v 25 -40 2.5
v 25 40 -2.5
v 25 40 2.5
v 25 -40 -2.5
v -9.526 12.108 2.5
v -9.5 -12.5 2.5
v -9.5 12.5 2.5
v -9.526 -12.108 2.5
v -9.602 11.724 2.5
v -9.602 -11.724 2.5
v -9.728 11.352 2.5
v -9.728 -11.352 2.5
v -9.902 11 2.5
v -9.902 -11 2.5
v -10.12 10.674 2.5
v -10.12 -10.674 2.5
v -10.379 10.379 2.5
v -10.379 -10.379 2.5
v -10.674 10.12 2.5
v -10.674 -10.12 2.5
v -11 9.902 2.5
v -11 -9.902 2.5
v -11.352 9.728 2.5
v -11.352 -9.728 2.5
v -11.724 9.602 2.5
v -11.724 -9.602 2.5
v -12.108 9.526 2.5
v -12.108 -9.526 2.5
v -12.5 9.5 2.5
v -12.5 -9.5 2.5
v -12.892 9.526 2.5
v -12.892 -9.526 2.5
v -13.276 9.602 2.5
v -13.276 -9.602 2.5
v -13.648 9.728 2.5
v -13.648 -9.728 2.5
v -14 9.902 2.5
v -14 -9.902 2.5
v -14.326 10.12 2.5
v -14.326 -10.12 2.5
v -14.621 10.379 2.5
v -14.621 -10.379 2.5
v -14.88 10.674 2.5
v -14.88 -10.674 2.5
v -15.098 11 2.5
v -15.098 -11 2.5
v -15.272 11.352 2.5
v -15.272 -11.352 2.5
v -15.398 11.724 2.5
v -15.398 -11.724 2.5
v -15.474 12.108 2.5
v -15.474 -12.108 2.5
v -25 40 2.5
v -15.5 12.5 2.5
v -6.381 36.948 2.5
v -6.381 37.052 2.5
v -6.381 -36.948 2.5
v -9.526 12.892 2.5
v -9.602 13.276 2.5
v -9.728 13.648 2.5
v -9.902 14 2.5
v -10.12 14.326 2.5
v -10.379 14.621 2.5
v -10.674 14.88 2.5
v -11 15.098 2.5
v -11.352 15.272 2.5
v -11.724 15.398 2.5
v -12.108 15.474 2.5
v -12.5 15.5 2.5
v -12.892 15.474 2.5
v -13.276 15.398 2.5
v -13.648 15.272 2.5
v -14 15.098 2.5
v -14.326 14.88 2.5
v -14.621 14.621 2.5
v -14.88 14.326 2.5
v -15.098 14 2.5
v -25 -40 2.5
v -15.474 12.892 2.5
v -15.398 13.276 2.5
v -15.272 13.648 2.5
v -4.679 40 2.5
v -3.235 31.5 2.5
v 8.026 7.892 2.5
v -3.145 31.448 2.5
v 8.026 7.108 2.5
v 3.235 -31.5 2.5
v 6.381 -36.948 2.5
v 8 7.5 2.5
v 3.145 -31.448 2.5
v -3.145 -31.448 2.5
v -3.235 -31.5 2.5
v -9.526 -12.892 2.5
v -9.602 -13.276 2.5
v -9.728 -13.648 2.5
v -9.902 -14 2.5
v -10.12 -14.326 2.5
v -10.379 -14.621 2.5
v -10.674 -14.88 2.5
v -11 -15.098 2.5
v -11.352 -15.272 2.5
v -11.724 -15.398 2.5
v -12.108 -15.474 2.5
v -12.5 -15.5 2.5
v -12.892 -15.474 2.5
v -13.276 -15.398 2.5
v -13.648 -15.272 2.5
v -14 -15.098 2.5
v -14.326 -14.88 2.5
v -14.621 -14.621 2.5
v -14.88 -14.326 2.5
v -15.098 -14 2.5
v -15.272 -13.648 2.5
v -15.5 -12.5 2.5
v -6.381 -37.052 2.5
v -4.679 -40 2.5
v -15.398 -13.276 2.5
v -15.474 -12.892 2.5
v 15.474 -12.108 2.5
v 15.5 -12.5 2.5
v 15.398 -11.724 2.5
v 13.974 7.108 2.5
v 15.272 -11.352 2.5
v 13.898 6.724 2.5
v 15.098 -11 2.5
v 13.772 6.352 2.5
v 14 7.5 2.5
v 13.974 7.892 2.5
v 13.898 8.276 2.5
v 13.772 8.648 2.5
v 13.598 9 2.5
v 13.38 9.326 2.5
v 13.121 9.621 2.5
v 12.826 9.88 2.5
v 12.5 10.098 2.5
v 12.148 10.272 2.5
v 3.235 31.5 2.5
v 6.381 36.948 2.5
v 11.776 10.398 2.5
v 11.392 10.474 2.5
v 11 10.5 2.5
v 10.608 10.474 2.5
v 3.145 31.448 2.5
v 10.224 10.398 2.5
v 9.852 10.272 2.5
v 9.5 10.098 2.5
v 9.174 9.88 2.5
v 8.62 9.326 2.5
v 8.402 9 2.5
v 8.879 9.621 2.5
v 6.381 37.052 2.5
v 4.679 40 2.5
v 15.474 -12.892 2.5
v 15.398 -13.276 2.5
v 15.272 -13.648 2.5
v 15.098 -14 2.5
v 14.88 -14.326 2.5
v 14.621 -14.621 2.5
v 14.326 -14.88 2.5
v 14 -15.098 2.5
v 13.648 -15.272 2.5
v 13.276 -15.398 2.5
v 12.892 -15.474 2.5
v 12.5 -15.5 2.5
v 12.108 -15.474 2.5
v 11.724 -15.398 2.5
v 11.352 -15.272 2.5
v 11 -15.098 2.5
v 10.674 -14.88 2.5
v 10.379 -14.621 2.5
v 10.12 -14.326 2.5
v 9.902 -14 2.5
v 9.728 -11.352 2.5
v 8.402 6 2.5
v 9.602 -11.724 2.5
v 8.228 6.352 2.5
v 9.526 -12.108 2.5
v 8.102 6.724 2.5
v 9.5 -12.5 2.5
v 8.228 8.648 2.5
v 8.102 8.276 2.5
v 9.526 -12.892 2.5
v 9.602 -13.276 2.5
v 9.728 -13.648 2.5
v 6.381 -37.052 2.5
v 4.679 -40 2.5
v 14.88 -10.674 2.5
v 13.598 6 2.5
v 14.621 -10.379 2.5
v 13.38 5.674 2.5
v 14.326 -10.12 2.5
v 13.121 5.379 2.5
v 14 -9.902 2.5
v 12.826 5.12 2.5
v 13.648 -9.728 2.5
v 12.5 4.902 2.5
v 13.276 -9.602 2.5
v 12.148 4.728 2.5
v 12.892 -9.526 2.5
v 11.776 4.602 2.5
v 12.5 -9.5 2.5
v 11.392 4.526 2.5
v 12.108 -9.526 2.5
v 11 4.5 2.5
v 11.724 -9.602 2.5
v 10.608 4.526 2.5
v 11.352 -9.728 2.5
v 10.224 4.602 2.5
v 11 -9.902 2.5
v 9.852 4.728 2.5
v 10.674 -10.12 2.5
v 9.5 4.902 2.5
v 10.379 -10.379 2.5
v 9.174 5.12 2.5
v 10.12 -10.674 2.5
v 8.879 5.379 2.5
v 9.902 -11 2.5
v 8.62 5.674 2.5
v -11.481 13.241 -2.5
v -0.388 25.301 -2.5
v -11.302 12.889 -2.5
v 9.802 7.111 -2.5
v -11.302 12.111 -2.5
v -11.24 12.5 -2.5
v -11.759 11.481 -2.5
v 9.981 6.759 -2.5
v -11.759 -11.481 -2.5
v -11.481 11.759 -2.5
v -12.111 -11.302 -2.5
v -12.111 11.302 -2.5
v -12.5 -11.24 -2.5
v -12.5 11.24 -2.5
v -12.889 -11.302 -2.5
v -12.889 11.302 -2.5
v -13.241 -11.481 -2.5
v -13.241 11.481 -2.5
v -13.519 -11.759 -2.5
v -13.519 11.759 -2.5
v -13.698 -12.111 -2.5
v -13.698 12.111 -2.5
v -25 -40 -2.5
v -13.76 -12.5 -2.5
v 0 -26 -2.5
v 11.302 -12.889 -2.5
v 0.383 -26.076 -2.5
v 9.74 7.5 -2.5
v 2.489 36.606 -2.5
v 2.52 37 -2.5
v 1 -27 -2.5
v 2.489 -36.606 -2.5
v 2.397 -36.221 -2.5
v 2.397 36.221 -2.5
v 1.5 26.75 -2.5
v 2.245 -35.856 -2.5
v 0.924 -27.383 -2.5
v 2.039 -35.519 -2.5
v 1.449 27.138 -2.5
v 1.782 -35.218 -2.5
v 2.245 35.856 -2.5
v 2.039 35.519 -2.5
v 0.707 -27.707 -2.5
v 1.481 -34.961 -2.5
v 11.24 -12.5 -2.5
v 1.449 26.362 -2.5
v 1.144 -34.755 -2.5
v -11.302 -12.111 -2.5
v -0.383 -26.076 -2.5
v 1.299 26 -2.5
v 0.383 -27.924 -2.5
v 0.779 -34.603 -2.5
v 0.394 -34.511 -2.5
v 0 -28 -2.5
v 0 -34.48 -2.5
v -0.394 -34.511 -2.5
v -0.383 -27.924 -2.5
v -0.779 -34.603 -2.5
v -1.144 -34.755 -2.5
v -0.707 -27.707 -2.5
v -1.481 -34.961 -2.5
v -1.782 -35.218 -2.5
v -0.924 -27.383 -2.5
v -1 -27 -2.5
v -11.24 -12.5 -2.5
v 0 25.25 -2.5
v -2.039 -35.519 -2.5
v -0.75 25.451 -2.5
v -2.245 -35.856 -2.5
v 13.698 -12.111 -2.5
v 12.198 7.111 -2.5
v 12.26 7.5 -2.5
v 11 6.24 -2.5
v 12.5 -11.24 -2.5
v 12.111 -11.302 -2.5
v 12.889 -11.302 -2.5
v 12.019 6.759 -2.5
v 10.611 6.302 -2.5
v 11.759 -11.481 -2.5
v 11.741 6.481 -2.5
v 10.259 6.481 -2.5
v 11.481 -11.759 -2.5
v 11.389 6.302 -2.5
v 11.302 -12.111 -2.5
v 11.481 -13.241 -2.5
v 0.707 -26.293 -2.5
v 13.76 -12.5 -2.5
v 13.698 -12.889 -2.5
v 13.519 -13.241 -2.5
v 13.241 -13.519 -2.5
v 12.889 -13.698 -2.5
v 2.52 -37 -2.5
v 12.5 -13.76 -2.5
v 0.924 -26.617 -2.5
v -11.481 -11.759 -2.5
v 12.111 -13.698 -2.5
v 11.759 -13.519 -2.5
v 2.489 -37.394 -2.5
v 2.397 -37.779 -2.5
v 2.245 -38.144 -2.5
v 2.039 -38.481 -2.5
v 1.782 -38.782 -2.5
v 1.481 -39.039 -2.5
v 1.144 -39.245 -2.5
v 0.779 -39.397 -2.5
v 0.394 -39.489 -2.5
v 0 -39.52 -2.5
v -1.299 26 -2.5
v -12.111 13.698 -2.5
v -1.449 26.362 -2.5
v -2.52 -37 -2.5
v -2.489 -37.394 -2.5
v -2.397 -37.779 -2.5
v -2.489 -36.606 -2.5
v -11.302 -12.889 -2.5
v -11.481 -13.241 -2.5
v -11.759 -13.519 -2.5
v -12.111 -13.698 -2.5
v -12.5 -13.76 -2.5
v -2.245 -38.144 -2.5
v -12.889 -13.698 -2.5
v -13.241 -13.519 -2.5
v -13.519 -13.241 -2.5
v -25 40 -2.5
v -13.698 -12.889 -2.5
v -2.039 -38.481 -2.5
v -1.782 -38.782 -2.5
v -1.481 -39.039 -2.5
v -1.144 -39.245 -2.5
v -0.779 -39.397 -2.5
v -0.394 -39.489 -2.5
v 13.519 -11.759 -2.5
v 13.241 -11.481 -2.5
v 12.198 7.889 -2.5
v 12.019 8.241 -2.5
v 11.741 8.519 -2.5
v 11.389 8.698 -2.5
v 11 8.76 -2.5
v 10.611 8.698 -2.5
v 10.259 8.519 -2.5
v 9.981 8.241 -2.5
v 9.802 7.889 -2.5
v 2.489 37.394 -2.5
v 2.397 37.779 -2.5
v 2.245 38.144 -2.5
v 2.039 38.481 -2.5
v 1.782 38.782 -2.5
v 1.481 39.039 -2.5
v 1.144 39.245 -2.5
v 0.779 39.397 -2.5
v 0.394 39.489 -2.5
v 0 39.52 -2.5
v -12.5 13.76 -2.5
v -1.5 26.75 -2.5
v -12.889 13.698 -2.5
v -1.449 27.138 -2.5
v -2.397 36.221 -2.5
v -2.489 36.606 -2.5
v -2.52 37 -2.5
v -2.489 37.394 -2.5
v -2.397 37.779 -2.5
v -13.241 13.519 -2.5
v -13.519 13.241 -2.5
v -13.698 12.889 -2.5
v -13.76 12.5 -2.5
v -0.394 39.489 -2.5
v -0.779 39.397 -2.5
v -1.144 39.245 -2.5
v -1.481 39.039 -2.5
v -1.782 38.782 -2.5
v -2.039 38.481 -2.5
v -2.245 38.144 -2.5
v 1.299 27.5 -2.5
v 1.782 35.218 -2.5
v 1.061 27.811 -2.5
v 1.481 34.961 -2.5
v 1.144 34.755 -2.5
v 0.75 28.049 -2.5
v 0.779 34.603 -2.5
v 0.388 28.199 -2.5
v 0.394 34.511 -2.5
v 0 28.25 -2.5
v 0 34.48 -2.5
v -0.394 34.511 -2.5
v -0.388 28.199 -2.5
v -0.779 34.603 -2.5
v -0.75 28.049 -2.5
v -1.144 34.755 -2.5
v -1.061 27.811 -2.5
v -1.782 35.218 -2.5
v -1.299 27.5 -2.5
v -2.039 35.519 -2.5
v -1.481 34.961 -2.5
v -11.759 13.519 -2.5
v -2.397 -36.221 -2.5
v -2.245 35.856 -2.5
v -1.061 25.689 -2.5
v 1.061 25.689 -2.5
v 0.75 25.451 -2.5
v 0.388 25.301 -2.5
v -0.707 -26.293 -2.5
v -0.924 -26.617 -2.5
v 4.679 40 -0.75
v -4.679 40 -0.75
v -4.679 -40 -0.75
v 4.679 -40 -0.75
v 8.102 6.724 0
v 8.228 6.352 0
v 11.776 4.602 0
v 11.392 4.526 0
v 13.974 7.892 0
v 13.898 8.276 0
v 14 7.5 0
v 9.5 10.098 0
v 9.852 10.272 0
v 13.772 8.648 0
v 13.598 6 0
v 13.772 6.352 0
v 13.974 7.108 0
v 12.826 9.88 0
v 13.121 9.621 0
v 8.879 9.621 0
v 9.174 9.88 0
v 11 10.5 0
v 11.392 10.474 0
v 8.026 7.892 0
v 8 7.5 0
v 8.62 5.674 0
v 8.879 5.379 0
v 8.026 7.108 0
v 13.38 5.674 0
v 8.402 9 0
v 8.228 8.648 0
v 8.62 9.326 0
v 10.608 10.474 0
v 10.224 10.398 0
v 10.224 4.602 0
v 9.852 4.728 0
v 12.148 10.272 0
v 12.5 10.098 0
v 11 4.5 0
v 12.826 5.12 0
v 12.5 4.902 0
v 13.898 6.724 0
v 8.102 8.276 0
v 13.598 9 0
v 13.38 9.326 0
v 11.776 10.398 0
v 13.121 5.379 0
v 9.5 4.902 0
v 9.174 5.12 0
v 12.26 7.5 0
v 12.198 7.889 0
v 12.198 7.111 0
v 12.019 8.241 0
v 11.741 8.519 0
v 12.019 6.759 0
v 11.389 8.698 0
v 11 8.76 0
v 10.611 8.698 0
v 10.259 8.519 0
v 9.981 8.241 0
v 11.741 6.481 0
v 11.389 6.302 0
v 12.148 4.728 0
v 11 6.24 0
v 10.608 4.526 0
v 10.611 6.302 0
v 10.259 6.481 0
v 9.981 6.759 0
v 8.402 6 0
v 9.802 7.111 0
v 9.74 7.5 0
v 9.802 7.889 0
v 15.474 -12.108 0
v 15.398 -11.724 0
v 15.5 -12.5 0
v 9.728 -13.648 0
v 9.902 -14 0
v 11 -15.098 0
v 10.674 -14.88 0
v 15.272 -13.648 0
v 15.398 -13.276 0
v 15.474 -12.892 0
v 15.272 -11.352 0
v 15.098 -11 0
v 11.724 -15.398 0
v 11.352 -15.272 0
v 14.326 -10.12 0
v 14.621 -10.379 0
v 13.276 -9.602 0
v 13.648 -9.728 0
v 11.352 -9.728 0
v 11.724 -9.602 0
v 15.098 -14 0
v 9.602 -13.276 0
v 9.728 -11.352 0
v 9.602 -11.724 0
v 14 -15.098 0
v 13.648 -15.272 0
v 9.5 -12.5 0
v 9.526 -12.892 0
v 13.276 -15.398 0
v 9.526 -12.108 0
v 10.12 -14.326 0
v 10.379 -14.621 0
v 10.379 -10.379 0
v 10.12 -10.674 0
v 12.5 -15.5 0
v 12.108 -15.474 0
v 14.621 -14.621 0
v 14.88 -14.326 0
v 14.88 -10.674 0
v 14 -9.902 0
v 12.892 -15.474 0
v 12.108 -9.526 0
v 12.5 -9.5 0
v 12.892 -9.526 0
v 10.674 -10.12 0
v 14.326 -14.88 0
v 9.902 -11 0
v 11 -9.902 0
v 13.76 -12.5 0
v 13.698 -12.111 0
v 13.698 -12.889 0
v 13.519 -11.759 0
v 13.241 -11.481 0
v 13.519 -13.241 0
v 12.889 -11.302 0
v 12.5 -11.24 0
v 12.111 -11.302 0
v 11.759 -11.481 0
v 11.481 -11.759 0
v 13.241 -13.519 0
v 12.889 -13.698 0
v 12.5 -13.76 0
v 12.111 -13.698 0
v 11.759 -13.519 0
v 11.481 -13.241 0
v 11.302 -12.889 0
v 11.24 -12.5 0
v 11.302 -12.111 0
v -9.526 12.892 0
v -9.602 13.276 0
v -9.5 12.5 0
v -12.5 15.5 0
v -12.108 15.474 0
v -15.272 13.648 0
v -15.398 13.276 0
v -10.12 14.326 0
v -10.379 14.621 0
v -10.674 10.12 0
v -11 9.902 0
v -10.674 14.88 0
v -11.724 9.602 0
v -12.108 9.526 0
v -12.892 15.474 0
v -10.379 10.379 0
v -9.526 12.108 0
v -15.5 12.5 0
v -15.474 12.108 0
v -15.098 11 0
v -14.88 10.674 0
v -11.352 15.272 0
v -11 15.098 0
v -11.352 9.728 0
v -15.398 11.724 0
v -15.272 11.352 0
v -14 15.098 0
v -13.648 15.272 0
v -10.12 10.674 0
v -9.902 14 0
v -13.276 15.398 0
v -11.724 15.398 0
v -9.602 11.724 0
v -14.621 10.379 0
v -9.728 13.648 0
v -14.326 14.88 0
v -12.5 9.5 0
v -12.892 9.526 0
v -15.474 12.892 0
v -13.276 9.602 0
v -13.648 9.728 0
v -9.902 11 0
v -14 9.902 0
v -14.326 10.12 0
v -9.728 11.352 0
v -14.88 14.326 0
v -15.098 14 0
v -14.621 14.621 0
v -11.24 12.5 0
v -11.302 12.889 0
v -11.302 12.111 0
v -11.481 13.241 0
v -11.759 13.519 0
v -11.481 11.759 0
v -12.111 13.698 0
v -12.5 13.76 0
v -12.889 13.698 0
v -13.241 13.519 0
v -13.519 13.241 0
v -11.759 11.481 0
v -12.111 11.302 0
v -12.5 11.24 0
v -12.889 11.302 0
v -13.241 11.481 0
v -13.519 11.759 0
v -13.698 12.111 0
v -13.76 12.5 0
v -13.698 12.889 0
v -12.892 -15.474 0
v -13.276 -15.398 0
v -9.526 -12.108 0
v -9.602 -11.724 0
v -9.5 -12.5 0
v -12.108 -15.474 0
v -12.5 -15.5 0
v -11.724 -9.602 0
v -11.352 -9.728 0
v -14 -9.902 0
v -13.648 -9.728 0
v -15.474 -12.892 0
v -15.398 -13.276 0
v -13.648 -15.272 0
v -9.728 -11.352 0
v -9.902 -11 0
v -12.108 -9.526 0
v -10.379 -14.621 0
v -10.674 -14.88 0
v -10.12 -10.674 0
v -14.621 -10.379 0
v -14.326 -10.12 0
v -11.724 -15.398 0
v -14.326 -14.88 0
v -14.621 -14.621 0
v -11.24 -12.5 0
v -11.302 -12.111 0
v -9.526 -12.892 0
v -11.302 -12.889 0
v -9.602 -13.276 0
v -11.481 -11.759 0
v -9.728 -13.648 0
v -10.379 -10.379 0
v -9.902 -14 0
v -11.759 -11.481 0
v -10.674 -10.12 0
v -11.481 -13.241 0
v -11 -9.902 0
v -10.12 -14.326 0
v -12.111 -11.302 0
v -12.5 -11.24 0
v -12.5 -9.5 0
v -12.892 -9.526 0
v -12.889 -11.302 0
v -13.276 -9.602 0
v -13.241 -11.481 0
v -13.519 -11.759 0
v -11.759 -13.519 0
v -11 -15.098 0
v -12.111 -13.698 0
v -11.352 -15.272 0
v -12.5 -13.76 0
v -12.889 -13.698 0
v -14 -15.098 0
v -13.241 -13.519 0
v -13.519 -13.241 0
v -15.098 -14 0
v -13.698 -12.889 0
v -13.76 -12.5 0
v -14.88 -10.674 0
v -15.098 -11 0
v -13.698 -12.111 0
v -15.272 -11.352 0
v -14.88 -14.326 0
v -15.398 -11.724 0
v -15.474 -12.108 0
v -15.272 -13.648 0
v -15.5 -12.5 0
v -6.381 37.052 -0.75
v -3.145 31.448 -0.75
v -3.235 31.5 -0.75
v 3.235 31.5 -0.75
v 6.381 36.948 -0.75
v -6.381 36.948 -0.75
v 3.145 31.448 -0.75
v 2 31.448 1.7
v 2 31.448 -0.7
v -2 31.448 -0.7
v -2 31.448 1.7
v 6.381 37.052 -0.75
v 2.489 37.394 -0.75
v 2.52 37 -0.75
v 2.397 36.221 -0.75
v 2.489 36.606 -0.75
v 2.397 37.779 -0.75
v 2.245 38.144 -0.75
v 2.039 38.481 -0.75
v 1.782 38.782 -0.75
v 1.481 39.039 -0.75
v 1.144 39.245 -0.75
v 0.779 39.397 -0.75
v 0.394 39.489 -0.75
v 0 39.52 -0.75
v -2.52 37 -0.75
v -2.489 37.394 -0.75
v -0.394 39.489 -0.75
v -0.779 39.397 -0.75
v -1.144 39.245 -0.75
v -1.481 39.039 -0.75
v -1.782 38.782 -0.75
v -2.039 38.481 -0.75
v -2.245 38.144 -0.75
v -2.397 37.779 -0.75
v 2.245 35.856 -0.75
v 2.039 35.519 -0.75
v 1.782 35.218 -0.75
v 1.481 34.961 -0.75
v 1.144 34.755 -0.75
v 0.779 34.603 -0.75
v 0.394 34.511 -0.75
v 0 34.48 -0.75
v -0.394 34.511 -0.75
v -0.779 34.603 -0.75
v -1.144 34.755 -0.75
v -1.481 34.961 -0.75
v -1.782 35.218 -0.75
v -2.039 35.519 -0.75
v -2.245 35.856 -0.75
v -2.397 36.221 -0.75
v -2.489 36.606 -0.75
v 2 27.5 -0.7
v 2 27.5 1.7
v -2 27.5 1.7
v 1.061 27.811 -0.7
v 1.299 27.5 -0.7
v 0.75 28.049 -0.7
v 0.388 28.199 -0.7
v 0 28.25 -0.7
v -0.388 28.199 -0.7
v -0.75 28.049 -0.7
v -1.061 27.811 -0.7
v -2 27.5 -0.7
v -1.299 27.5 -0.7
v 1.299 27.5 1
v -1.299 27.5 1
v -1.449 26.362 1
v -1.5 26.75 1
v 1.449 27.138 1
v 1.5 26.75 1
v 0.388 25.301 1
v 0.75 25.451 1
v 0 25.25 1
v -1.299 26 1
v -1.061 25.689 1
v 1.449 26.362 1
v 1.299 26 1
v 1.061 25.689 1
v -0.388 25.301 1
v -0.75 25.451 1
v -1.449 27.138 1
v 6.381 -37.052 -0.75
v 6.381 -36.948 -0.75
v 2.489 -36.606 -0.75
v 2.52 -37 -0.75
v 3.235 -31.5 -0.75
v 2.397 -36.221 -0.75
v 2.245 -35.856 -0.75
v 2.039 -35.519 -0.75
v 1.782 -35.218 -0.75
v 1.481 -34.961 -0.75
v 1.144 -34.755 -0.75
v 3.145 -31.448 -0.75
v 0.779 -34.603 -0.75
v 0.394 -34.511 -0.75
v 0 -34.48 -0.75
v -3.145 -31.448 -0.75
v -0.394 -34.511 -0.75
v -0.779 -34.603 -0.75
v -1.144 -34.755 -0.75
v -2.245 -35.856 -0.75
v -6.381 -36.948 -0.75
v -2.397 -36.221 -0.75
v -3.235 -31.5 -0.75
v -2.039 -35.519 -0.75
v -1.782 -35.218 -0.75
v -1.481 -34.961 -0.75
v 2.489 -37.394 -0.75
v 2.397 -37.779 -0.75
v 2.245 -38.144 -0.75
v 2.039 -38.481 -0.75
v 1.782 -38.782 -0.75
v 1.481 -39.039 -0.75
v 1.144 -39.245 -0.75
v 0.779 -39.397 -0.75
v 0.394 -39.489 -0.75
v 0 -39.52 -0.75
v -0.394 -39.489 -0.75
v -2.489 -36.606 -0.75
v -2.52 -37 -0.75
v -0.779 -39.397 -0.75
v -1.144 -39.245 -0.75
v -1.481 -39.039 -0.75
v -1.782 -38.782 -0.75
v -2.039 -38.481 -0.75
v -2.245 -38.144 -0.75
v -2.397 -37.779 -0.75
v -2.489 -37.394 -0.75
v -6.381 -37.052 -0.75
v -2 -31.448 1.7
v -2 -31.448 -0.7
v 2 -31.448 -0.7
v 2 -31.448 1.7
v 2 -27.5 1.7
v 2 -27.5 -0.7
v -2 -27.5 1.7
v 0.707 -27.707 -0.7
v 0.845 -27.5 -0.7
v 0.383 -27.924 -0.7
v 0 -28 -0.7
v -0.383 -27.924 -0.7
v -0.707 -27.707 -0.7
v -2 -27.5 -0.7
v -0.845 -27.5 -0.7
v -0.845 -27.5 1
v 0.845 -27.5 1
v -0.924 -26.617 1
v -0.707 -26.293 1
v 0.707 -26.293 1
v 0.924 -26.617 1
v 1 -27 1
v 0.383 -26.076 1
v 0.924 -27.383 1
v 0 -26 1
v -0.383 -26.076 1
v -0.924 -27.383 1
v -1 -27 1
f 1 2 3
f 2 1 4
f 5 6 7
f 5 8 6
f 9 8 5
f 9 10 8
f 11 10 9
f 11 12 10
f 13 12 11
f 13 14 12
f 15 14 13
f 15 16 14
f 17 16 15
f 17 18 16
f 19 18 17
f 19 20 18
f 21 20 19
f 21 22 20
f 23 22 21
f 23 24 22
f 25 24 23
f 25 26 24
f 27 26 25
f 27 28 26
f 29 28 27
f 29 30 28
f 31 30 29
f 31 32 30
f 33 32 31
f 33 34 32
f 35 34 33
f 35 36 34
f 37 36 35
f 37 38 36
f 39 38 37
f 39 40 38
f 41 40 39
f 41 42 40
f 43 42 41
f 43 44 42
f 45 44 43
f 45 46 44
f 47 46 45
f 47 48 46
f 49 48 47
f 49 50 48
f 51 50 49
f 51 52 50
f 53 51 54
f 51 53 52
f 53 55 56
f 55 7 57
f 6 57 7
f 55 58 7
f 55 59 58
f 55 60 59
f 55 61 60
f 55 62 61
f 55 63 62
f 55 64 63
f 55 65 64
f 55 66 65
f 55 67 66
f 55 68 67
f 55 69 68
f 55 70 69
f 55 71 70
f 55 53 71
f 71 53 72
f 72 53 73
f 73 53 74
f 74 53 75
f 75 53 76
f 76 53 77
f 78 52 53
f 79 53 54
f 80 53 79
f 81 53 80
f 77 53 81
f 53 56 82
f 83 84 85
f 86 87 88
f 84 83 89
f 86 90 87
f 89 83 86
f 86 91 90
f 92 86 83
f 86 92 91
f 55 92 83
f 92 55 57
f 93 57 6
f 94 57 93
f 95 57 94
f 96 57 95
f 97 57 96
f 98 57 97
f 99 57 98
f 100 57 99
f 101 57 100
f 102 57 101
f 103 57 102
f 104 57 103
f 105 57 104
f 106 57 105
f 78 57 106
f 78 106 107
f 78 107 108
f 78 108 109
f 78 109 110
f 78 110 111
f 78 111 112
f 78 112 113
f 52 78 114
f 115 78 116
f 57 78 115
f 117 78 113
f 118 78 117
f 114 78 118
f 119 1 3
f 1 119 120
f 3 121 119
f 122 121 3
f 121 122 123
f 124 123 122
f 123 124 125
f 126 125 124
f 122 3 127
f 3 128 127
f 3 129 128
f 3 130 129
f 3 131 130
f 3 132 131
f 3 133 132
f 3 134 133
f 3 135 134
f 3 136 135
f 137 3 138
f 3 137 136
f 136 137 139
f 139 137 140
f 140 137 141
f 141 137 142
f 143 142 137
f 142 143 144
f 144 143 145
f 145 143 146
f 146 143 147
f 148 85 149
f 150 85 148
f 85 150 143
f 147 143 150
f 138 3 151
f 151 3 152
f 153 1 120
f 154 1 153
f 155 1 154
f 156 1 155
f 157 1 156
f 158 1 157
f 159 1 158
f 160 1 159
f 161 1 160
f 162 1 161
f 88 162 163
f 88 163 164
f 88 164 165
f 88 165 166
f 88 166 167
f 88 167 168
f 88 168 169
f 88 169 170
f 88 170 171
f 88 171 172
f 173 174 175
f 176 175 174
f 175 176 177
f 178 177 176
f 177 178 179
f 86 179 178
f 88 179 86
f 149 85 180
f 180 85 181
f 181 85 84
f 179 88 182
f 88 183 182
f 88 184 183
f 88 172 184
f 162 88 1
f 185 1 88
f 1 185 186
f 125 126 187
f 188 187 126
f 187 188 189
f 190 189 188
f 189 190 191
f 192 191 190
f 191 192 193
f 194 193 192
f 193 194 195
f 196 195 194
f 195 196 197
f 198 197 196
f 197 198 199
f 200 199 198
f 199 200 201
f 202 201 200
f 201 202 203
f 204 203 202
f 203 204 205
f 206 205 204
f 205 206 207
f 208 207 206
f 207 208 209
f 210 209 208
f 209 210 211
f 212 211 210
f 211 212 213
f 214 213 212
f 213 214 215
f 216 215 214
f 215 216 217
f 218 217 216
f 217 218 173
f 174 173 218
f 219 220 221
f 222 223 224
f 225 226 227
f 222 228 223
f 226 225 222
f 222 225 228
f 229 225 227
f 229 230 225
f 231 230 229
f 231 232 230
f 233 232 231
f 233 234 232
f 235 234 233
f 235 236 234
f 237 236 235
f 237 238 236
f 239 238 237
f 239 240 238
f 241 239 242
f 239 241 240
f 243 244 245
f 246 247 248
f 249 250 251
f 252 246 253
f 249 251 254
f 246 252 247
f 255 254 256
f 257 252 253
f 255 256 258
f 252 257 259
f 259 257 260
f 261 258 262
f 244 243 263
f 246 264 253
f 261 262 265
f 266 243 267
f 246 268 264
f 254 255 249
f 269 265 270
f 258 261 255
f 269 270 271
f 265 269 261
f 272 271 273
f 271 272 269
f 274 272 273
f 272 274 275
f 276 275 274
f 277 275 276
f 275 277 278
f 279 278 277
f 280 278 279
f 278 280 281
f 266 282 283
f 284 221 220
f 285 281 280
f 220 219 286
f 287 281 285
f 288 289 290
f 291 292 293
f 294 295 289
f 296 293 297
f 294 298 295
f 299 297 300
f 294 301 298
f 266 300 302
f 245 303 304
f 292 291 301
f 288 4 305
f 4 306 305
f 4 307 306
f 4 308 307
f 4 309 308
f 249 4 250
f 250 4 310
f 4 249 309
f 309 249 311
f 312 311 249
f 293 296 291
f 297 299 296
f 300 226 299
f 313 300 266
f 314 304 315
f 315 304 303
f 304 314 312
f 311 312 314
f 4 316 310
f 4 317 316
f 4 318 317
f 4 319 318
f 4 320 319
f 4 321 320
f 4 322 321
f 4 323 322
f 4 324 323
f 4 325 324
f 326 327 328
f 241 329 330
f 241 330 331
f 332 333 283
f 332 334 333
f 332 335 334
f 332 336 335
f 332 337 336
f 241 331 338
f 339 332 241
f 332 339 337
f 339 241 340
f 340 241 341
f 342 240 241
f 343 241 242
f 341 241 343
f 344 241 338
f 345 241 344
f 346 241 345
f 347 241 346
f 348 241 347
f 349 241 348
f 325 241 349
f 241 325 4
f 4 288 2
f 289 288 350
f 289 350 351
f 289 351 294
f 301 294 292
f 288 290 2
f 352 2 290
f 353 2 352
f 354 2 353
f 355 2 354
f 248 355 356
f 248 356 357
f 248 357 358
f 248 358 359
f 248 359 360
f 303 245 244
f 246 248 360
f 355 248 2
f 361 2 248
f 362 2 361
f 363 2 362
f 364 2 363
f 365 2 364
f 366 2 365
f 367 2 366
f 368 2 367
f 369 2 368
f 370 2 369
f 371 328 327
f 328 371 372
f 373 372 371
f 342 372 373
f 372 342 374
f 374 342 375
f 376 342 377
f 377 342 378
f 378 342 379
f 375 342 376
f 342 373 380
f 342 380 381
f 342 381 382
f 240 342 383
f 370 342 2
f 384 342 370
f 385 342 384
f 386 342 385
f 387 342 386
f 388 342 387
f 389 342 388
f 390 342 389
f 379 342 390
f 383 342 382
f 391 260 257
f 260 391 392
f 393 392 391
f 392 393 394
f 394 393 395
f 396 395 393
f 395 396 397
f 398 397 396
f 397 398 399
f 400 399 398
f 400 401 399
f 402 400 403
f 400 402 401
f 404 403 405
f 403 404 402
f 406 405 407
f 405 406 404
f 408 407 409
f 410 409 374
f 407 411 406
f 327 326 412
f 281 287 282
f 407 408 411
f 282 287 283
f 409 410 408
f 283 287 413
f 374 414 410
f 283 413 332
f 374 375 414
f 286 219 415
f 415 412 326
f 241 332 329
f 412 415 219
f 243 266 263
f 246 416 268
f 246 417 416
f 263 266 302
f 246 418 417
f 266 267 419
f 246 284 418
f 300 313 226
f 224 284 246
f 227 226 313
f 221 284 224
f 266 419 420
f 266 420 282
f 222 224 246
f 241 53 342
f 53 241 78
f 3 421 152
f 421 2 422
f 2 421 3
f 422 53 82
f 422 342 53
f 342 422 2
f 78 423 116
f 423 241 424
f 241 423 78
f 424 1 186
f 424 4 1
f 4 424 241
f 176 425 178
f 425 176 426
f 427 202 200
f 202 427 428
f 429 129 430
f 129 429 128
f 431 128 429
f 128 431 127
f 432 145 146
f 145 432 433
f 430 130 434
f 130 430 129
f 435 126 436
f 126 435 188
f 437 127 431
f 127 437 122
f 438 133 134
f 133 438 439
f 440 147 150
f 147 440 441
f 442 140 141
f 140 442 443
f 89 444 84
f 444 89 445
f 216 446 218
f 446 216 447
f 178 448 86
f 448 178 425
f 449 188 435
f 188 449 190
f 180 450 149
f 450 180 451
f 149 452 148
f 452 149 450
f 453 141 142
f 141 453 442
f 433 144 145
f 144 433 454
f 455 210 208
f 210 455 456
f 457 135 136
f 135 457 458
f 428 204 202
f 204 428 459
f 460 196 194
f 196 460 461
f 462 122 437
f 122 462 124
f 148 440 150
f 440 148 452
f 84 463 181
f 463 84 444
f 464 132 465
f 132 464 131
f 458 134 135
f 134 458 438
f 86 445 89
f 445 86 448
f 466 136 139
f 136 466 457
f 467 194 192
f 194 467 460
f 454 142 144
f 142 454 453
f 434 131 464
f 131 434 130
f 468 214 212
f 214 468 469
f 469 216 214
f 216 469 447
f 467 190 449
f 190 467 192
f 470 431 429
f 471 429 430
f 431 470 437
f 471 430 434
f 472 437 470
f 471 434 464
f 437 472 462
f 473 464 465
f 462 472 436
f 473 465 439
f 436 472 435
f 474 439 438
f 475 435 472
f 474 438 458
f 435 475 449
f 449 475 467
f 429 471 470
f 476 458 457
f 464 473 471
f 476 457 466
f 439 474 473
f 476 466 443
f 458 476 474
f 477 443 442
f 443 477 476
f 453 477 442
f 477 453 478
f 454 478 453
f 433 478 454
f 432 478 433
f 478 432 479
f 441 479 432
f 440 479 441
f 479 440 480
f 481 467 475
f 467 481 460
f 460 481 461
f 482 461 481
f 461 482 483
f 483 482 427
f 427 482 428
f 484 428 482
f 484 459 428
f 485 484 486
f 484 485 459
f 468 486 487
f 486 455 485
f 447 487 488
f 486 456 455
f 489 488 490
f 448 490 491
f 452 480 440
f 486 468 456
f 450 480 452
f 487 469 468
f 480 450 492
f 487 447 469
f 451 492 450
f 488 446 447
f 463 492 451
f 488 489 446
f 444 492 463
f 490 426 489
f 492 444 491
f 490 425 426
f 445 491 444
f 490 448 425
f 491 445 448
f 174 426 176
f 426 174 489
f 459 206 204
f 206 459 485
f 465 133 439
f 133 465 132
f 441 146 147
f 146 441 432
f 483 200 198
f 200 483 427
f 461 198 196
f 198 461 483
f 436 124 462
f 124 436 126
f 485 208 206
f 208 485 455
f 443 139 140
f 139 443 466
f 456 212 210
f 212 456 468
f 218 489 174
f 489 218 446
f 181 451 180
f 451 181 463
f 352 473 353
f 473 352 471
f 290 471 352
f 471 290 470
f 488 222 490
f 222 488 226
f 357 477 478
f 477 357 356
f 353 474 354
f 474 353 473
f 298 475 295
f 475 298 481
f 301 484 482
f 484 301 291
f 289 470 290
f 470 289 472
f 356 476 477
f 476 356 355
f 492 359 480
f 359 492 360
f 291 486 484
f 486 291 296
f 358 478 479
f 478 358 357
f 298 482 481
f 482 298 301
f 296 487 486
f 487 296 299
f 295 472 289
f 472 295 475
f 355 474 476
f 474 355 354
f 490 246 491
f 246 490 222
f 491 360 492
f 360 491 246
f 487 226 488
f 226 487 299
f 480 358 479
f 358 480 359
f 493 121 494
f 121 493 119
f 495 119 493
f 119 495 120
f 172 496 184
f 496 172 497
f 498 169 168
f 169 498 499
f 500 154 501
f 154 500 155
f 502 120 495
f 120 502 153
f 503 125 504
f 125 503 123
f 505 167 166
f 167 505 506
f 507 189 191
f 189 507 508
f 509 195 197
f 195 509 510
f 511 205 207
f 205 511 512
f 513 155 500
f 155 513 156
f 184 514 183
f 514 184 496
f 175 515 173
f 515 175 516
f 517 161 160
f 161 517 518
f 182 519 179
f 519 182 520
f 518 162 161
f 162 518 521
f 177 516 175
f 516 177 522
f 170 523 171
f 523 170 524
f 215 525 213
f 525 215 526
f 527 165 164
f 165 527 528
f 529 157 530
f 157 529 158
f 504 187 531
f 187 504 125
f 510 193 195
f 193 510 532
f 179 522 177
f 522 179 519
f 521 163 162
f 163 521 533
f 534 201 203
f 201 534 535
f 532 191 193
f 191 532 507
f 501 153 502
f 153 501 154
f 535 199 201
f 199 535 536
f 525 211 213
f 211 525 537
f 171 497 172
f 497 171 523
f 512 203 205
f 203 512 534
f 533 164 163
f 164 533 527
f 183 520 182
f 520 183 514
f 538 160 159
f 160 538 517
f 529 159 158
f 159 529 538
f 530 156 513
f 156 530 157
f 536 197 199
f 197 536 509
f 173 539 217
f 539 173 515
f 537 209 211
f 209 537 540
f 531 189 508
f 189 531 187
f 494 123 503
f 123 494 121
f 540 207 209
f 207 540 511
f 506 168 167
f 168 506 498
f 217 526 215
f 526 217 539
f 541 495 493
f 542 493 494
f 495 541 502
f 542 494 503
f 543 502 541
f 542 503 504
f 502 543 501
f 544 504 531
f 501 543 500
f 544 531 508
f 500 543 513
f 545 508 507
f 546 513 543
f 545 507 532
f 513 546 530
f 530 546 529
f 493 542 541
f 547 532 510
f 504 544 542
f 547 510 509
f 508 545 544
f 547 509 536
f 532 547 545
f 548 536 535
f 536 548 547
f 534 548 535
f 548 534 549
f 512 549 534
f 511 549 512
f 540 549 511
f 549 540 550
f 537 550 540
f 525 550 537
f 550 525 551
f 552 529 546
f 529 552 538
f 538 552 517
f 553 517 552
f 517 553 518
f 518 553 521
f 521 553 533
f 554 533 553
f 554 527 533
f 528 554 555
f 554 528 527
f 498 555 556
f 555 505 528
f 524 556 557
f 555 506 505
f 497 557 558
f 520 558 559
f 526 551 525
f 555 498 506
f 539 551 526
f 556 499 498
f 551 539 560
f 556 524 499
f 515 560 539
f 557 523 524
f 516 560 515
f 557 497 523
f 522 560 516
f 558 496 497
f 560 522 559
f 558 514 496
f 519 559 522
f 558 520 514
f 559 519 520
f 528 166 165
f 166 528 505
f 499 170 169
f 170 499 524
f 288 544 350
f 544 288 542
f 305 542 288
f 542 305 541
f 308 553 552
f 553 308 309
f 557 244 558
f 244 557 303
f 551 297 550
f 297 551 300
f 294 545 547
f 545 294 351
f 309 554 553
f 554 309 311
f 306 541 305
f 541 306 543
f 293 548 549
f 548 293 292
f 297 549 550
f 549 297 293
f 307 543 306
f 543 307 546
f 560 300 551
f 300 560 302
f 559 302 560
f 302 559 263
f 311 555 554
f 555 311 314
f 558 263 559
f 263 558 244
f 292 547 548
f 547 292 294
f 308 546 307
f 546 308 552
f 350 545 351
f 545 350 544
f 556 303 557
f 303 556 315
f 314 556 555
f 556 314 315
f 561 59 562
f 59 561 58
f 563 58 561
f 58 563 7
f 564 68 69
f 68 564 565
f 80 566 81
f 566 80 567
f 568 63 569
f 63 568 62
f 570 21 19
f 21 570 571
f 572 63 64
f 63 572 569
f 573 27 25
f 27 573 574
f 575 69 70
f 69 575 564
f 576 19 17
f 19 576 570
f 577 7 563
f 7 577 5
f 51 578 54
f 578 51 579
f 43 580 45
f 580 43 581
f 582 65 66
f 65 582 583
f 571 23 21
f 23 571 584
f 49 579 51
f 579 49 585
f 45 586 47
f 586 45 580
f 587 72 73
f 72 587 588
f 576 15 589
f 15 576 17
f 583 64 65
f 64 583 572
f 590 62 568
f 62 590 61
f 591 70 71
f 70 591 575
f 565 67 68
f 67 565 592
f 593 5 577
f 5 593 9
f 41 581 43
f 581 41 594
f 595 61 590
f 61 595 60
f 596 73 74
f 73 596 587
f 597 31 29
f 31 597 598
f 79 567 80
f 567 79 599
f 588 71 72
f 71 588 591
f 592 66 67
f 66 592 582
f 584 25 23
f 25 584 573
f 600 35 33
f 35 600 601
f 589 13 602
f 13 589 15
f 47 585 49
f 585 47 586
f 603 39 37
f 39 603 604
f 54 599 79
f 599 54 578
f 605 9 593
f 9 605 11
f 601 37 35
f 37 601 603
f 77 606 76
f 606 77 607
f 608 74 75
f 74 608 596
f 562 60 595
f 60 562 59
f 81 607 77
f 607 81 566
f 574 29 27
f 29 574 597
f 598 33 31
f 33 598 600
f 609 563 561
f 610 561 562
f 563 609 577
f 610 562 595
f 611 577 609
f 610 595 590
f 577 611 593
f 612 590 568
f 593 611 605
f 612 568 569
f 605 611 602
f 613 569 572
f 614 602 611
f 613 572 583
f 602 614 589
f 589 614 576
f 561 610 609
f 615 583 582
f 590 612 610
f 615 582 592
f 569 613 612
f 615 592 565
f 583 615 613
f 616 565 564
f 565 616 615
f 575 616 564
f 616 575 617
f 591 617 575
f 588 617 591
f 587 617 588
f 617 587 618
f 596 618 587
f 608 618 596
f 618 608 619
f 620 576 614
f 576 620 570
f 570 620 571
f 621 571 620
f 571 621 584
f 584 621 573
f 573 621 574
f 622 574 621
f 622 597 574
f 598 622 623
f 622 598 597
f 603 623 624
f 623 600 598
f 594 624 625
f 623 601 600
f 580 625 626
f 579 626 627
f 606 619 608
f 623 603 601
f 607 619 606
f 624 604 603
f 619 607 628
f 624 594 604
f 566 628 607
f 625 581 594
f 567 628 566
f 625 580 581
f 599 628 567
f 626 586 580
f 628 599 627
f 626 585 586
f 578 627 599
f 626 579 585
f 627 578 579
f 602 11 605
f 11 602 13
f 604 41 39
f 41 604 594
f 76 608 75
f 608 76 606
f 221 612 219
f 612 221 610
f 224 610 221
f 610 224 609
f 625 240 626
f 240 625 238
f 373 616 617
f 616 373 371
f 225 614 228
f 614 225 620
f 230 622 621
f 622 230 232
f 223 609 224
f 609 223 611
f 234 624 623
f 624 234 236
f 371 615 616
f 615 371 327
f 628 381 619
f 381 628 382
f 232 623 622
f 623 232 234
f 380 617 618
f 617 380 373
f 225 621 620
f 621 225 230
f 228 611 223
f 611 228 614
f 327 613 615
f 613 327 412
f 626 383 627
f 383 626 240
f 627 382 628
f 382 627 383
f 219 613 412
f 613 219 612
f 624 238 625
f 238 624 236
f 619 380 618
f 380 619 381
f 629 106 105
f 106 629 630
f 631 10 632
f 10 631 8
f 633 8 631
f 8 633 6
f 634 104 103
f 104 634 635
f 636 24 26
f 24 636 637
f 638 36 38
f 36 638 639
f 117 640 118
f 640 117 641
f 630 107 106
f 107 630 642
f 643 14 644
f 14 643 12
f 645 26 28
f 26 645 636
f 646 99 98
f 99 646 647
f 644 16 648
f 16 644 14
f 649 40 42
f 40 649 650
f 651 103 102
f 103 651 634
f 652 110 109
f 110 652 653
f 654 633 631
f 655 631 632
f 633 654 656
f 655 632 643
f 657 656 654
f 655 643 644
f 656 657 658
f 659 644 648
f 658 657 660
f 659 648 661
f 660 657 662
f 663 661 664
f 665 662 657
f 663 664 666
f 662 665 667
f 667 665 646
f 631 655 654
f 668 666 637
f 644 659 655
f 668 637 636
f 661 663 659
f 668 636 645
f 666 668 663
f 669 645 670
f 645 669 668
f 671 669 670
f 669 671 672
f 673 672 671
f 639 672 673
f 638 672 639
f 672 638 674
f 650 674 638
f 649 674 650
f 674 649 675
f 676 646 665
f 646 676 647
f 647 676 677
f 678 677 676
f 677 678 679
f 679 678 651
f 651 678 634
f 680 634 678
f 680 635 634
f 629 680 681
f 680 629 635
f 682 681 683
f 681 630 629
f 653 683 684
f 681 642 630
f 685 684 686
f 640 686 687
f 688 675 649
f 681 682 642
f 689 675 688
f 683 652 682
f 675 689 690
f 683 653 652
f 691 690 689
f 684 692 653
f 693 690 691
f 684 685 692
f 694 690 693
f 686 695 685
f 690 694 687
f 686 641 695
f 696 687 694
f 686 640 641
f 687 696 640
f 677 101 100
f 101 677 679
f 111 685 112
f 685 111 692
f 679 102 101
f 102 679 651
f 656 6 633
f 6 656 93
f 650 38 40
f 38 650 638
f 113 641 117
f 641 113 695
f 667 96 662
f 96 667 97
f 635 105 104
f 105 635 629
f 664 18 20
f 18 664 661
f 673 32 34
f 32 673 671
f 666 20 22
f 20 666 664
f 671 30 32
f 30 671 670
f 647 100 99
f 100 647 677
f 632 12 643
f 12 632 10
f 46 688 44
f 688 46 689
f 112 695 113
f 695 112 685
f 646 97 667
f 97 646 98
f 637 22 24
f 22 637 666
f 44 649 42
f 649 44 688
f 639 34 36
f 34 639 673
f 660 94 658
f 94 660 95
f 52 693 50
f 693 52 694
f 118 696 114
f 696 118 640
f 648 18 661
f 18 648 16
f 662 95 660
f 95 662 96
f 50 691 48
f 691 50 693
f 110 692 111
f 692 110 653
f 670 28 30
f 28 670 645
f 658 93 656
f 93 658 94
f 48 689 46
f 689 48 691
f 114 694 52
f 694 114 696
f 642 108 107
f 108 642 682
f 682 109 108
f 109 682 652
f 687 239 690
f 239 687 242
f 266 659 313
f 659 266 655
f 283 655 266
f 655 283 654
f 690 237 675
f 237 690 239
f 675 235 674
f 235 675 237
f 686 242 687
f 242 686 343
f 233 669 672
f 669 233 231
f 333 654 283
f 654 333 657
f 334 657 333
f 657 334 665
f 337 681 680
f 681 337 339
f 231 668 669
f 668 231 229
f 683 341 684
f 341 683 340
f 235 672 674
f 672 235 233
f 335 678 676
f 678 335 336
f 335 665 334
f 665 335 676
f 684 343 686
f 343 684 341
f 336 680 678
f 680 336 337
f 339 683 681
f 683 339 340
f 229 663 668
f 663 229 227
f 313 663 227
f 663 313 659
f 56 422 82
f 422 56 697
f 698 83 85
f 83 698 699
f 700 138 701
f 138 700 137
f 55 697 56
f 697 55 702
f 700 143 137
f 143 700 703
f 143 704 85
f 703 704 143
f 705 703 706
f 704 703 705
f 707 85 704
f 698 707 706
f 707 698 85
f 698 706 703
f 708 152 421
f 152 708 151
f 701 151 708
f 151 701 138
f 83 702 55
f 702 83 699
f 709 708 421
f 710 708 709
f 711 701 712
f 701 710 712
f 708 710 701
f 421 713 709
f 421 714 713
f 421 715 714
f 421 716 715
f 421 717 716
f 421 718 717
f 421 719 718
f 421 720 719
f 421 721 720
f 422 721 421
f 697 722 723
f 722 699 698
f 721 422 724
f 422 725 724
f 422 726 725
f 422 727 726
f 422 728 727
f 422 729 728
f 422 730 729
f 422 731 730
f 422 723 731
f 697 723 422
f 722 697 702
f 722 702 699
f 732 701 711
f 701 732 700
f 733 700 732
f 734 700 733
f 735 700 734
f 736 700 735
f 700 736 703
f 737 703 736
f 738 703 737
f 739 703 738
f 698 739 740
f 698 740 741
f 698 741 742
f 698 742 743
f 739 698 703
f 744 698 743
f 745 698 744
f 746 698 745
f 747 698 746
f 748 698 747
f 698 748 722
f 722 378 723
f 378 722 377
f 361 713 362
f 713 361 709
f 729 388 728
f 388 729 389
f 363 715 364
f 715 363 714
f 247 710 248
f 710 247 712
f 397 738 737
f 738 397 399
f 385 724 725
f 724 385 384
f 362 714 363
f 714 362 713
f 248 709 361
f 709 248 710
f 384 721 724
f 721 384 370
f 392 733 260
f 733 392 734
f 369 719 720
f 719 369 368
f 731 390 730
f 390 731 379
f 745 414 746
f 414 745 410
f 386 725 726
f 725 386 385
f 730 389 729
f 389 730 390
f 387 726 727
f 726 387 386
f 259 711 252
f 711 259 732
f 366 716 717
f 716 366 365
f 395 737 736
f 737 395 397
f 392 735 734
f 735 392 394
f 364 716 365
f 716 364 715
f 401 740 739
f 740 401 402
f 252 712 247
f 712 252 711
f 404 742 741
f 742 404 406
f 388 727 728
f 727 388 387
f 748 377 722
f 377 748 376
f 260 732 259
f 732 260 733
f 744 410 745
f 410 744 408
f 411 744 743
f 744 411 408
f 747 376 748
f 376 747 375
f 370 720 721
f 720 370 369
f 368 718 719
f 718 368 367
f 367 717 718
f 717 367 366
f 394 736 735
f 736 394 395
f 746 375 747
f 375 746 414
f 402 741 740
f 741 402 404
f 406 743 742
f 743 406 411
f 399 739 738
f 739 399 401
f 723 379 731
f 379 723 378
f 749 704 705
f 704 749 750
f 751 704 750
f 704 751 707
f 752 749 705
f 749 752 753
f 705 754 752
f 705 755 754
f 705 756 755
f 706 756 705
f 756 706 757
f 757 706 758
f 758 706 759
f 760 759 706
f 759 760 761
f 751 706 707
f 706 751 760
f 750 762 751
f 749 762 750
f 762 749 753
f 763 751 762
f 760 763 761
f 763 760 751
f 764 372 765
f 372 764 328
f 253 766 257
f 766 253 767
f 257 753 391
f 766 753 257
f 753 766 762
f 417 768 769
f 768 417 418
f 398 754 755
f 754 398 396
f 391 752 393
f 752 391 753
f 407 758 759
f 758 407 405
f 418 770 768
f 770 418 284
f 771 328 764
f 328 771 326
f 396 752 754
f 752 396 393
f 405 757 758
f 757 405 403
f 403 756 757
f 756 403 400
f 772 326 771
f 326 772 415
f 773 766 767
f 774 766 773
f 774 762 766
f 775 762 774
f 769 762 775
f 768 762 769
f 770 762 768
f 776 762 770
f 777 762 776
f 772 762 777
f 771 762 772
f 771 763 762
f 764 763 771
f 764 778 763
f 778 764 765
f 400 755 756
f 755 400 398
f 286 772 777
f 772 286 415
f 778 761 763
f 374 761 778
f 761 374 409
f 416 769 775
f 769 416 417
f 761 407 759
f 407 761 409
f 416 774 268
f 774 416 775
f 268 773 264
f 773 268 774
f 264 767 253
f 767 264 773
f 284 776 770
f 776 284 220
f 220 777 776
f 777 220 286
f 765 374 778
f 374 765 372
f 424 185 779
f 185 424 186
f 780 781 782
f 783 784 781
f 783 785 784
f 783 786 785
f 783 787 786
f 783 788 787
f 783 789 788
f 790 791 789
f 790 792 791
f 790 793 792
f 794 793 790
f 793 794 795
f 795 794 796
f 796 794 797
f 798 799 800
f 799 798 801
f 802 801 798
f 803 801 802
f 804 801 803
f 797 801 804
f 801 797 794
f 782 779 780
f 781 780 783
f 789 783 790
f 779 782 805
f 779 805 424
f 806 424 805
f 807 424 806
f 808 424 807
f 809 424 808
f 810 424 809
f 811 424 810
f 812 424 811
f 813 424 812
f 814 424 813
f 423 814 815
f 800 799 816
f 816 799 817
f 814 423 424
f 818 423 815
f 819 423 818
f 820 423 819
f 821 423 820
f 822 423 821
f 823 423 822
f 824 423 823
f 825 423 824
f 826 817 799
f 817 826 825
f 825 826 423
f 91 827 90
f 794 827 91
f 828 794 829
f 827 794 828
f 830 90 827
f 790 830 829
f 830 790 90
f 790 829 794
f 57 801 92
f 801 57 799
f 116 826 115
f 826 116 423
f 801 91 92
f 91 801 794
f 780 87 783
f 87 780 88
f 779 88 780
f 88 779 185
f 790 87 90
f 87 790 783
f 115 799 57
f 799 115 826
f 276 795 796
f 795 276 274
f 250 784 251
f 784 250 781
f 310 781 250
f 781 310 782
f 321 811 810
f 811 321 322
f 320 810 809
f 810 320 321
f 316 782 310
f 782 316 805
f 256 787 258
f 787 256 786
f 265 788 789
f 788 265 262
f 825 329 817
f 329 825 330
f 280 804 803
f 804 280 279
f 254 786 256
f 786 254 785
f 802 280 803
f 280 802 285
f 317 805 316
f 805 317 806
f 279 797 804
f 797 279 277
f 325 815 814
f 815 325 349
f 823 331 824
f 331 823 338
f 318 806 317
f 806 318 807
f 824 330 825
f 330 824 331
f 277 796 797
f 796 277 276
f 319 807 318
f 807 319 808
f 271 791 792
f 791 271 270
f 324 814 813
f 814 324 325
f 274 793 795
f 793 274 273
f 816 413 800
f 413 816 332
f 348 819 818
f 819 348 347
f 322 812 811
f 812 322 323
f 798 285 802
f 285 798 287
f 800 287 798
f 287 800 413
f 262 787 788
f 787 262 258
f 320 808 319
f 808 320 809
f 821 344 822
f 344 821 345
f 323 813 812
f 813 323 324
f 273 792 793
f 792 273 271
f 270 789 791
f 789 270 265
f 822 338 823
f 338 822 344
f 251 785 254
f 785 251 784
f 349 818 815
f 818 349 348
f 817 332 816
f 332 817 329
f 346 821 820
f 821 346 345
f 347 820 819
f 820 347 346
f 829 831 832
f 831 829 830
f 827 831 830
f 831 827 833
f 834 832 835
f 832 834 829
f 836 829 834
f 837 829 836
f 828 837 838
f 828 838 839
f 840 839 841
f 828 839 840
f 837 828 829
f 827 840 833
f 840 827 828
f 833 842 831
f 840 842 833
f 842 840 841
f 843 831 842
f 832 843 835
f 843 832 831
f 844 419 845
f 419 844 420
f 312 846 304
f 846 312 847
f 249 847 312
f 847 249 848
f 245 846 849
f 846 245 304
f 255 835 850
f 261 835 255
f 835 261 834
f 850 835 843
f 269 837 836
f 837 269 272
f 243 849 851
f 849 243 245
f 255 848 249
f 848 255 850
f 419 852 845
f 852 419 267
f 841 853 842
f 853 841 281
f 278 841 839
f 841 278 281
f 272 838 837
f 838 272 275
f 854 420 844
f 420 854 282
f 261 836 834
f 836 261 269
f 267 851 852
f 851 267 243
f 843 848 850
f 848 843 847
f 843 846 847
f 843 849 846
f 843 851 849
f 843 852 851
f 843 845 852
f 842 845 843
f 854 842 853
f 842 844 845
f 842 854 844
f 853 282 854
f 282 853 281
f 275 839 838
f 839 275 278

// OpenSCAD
$fa = 1;
$fs = 0.4;

module phex(wid,rad,height){
hull(){
translate([wid/2-rad,0,0])cylinder(r=rad,h=height);
rotate([0,0,60])translate([wid/2-rad,0,0])cylinder(r=rad,h=height);
rotate([0,0,120])translate([wid/2-rad,0,0])cylinder(r=rad,h=height);
rotate([0,0,180])translate([wid/2-rad,0,0])cylinder(r=rad,h=height);
rotate([0,0,240])translate([wid/2-rad,0,0])cylinder(r=rad,h=height);
rotate([0,0,300])translate([wid/2-rad,0,0])cylinder(r=rad,h=height);

}
}

module fhex(wid,height){
hull(){
cube([wid/1.7,wid,height],center = true);
rotate([0,0,120])cube([wid/1.7,wid,height],center = true);
rotate([0,0,240])cube([wid/1.7,wid,height],center = true);
}
}




difference(){
cube([50
,80,5],center=true);

translate([11,7.5,(2.24+0.5)/2])
cylinder(h=2.24+0.5+0.001,r=6/2,center=true);

translate([11,7.5,0])
cylinder(h=5.5+0.001,r=2.52/2,center=true);

translate([12.5,-12.5,(2.24+0.5)/2])
cylinder(h=2.24+0.5+0.001,r=6/2,center=true);
translate([12.5,-12.5,0])
cylinder(h=5+0.5+0.001,r=2.52/2,center=true);

translate([-12.5,12.5,(2.24+0.5)/2])
cylinder(h=2.24+0.5+0.001,r=6/2,center=true);
translate([-12.5,12.5,0])
cylinder(h=5+0.5+0.001,r=2.52/2,center=true);
    
translate([-12.5,-12.5,(2.24+0.5)/2])
cylinder(h=2.24+0.5+0.001,r=6/2,center=true);
translate([-12.5,-12.5,0])
cylinder(h=5+0.001,r=2.52/2,center=true);

//hexagono superior 
translate([0,37,1.2])
fhex(11,4-0.1);

//hueco para bulon concentrico a hexagono
translate([0,37,1.5])
cylinder(h=8+0.001,r=5.04/2,center=true);

//hueco rectangular 37mm-5(ancho de hexagono)-largo/2 de hueco
translate([0,32-4/2,1/2])
color([1,0,1])cube([4
,5,2.4],center=true);


// Cilindro al final del hueco 32-Ltotal-radio/2
translate([0,32-4.5-1.5/2,-1])
cylinder(h=4+0.001,r=1.5,center=true);

//hexagono inferior

translate([0,-37,1.2])
fhex(11,4-0.1);

translate([0,-37,1.5])
cylinder(h=8+0.001,r=5.04/2,center=true); 

translate([0,-32+4/2,1/2])
color([1,0,0])cube([4
,5,2.4],center=true);

translate([0,-32+4.5+1/2,-1])
cylinder(h=4+0.001,r=1,center=true);

}

//color([100,0,1])cube([300,300,4-1], center=true);
